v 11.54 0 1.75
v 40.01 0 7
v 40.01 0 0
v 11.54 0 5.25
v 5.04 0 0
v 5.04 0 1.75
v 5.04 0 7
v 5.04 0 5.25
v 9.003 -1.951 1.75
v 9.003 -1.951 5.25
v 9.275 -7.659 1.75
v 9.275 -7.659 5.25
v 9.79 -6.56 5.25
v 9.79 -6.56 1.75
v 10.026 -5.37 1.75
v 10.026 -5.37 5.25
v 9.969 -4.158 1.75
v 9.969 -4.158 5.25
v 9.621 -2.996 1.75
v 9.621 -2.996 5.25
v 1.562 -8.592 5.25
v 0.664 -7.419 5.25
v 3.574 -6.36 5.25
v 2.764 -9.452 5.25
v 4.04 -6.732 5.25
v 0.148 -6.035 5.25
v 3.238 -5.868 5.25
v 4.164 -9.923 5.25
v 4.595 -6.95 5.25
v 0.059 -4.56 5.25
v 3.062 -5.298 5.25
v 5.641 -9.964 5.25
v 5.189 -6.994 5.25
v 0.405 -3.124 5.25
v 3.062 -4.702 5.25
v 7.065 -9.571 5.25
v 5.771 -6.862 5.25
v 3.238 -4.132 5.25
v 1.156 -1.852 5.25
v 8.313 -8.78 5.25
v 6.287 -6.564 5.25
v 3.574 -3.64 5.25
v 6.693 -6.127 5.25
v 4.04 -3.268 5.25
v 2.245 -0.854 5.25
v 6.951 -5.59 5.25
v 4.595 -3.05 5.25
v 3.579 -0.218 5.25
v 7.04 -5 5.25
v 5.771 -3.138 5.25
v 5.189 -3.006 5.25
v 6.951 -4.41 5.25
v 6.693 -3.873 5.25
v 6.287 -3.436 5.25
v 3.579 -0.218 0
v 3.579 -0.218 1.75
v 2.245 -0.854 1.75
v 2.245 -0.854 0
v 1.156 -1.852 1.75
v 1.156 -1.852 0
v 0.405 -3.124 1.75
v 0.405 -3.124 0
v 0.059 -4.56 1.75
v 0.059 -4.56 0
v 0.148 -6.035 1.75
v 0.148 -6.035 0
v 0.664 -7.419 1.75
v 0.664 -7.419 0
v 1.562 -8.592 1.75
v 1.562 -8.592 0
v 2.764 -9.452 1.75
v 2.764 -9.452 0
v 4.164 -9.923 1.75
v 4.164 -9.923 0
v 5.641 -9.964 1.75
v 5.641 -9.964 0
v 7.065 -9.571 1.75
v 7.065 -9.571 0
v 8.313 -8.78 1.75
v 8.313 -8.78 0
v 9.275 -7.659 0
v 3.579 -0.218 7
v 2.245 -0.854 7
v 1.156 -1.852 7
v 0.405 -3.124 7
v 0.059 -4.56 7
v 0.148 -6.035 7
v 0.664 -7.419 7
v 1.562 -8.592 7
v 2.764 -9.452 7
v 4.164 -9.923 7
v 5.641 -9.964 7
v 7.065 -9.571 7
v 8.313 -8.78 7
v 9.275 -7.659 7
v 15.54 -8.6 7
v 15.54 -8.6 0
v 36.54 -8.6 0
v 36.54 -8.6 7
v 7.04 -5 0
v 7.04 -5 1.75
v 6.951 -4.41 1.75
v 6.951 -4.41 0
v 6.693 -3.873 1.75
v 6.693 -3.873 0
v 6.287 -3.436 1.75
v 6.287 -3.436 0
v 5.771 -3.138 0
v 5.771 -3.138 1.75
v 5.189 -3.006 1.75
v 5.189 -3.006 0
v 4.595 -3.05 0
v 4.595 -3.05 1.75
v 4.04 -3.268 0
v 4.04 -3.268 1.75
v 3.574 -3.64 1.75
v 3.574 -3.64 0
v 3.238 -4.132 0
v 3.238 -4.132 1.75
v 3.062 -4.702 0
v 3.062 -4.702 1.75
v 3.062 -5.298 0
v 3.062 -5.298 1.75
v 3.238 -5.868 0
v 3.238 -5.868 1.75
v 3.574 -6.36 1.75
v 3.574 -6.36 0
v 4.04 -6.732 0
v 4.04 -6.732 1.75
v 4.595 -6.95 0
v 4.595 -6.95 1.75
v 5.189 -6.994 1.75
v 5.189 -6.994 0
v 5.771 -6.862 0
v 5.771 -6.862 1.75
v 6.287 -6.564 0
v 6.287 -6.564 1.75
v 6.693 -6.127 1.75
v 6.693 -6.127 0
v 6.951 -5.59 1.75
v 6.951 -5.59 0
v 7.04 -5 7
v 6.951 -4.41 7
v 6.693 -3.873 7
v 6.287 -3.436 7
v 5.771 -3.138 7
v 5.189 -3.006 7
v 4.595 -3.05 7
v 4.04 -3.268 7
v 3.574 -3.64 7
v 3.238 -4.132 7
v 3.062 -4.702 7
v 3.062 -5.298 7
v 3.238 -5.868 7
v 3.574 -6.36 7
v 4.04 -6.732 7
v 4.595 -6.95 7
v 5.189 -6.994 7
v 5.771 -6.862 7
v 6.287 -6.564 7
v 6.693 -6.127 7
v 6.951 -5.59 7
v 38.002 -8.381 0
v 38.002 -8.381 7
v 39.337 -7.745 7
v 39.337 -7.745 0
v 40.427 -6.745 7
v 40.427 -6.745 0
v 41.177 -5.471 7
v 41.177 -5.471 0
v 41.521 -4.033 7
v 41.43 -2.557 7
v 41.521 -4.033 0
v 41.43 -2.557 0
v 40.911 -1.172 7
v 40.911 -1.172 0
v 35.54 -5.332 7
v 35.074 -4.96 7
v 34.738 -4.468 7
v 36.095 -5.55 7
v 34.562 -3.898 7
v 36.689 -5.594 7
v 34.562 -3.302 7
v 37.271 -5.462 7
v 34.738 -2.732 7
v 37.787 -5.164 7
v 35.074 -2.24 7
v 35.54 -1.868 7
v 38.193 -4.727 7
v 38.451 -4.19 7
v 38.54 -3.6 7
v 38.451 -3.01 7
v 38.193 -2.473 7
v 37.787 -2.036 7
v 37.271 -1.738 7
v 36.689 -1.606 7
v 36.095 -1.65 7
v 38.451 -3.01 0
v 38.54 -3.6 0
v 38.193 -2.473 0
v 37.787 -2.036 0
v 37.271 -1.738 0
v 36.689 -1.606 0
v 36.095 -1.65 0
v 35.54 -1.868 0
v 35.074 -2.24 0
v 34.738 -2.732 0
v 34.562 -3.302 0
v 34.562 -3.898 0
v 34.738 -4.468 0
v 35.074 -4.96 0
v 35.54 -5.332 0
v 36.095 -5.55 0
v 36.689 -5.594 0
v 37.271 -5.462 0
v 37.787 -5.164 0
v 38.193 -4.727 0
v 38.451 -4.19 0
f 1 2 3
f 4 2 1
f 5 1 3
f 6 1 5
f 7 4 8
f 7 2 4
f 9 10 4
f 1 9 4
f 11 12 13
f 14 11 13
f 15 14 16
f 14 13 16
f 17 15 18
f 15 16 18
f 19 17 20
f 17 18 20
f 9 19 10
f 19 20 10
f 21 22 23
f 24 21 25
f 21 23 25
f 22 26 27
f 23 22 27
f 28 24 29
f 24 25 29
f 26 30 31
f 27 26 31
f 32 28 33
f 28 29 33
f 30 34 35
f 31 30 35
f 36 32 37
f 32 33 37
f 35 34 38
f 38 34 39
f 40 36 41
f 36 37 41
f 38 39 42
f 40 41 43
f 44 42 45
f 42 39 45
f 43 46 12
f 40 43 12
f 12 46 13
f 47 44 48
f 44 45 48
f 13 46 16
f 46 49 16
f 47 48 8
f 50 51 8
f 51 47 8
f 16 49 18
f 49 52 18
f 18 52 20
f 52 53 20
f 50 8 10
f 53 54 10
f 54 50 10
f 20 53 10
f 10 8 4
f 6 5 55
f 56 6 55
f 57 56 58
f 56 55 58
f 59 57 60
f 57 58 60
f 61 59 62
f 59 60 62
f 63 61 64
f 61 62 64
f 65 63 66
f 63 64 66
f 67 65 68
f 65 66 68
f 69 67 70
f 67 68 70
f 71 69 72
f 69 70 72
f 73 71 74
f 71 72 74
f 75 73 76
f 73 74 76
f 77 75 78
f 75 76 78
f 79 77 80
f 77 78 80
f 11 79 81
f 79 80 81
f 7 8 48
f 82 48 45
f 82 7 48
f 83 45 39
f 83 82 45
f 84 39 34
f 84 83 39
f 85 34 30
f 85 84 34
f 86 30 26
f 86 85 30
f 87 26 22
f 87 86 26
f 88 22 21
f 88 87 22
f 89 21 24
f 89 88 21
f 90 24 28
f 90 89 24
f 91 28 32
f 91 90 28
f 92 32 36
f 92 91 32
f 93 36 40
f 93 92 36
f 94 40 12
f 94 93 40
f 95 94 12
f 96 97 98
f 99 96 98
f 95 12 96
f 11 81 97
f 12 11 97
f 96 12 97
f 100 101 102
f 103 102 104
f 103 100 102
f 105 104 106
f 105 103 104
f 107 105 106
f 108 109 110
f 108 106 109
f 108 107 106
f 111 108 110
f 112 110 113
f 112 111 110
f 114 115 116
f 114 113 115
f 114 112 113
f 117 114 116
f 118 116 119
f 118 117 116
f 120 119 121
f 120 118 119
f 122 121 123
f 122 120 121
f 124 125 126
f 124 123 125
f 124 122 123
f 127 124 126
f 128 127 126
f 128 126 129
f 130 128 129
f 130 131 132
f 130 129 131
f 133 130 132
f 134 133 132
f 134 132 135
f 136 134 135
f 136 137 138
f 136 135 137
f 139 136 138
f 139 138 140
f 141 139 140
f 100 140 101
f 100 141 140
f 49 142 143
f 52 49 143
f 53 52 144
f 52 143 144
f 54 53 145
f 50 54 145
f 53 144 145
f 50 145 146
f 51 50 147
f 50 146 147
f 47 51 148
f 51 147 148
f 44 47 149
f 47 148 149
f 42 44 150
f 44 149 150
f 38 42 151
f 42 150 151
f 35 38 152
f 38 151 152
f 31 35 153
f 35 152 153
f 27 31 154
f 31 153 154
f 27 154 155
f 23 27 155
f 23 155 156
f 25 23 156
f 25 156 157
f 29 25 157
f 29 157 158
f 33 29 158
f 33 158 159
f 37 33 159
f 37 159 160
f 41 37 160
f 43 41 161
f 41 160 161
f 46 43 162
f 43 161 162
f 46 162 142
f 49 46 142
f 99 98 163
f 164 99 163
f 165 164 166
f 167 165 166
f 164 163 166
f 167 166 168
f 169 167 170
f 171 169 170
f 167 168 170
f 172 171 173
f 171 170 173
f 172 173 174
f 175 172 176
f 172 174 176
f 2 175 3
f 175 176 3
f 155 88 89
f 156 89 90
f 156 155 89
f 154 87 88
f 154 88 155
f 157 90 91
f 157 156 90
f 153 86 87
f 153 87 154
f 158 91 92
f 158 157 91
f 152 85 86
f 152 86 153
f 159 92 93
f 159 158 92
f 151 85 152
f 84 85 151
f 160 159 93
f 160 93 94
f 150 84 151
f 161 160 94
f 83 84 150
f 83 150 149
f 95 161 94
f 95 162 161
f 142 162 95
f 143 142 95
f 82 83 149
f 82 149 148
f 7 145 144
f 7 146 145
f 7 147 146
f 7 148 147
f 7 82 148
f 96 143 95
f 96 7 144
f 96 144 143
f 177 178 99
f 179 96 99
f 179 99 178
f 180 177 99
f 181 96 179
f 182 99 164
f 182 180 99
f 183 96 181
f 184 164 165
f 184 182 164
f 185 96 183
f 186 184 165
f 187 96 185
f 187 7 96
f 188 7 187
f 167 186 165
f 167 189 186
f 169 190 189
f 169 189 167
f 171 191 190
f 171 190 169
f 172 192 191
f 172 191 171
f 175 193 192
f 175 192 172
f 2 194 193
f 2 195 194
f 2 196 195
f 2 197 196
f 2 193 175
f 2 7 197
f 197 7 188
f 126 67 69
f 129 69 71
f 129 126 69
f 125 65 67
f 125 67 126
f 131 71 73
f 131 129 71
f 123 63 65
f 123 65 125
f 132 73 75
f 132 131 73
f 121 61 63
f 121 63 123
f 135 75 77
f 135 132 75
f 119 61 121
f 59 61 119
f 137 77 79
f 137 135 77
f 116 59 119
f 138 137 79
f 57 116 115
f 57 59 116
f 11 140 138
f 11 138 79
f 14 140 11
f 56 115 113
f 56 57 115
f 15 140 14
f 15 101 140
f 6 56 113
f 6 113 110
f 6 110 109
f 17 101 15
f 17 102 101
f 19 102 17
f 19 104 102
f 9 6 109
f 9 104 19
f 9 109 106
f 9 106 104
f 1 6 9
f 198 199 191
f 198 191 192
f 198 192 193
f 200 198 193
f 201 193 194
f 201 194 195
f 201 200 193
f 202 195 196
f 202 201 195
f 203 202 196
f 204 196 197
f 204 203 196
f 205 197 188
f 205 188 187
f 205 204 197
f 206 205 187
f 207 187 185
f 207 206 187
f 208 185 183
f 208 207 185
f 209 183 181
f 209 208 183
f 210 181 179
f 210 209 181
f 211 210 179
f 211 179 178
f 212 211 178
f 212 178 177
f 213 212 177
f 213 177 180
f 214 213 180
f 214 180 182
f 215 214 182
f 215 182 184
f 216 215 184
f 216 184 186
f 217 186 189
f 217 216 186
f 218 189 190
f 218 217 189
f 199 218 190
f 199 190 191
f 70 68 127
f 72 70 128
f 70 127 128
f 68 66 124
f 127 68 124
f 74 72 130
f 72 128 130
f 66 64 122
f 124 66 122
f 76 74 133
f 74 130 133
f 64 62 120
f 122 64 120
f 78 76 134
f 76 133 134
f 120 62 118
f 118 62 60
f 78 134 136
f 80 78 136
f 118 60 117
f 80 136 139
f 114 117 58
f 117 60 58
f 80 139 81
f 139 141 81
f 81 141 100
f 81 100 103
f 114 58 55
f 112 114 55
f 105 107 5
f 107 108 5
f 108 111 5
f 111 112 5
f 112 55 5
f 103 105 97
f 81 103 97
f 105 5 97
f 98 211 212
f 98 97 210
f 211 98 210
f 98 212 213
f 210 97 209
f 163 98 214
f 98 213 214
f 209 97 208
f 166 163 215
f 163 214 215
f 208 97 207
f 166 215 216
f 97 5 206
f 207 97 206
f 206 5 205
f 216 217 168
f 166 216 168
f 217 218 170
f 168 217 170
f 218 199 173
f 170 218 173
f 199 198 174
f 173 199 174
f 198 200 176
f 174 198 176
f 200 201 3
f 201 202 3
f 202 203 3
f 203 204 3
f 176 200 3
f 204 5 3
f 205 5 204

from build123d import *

# Parameters (mm, degrees)
F0_R     = 2
F1_DEPTH = 7
F3_DEPTH = 5.25
F4_DEPTH = 1.75
F5_R     = 2
F6_DEPTH = 1.75


with BuildPart() as f1:
    # F0 (on Top) → F1 (new body)
    with BuildSketch(Plane.XY):
        with BuildLine():
            Line((40.009908, 0), (5.040038, 0))
            ThreePointArc((5.040038, 0), (0.664349, -7.419369), (9.274601, -7.658661))
            Line((9.274601, -7.658661), (15.540038, -8.6))
            Line((15.540038, -8.6), (36.540038, -8.6))
            ThreePointArc((36.540038, -8.6), (41.176847, -5.470829), (40.009908, 0))
        make_face()
        with Locations((5.040038, -5)):
            Circle(F0_R, mode=Mode.SUBTRACT)
        with Locations((36.540038, -3.6)):
            Circle(F0_R, mode=Mode.SUBTRACT)
    extrude(amount=F1_DEPTH)

    # F2 (on face) → F3 (cut)
    with BuildSketch(Plane.XY.offset(7)):
        with BuildLine():
            Line((11.540038, 0), (5.040038, 0))
            ThreePointArc((5.040038, 0), (2.831279, -9.485687), (9.003158, -1.951446))
            Line((9.003158, -1.951446), (11.540038, 0))
        make_face()
    extrude(amount=-F3_DEPTH, mode=Mode.SUBTRACT)

    # F2 (on face) → F4 (join)
    with BuildSketch(Plane.XY.offset(7)):
        with BuildLine():
            Line((11.540038, 0), (5.040038, 0))
            ThreePointArc((5.040038, 0), (2.831279, -9.485687), (9.003158, -1.951446))
            Line((9.003158, -1.951446), (11.540038, 0))
        make_face()
    extrude(amount=-F4_DEPTH)

    # F5 (on face) → F6 (cut)
    with BuildSketch(Plane.XY.offset(7)):
        with Locations((5.040038, -5)):
            Circle(F5_R)
    extrude(amount=-F6_DEPTH, mode=Mode.SUBTRACT)


solid = f1.part
